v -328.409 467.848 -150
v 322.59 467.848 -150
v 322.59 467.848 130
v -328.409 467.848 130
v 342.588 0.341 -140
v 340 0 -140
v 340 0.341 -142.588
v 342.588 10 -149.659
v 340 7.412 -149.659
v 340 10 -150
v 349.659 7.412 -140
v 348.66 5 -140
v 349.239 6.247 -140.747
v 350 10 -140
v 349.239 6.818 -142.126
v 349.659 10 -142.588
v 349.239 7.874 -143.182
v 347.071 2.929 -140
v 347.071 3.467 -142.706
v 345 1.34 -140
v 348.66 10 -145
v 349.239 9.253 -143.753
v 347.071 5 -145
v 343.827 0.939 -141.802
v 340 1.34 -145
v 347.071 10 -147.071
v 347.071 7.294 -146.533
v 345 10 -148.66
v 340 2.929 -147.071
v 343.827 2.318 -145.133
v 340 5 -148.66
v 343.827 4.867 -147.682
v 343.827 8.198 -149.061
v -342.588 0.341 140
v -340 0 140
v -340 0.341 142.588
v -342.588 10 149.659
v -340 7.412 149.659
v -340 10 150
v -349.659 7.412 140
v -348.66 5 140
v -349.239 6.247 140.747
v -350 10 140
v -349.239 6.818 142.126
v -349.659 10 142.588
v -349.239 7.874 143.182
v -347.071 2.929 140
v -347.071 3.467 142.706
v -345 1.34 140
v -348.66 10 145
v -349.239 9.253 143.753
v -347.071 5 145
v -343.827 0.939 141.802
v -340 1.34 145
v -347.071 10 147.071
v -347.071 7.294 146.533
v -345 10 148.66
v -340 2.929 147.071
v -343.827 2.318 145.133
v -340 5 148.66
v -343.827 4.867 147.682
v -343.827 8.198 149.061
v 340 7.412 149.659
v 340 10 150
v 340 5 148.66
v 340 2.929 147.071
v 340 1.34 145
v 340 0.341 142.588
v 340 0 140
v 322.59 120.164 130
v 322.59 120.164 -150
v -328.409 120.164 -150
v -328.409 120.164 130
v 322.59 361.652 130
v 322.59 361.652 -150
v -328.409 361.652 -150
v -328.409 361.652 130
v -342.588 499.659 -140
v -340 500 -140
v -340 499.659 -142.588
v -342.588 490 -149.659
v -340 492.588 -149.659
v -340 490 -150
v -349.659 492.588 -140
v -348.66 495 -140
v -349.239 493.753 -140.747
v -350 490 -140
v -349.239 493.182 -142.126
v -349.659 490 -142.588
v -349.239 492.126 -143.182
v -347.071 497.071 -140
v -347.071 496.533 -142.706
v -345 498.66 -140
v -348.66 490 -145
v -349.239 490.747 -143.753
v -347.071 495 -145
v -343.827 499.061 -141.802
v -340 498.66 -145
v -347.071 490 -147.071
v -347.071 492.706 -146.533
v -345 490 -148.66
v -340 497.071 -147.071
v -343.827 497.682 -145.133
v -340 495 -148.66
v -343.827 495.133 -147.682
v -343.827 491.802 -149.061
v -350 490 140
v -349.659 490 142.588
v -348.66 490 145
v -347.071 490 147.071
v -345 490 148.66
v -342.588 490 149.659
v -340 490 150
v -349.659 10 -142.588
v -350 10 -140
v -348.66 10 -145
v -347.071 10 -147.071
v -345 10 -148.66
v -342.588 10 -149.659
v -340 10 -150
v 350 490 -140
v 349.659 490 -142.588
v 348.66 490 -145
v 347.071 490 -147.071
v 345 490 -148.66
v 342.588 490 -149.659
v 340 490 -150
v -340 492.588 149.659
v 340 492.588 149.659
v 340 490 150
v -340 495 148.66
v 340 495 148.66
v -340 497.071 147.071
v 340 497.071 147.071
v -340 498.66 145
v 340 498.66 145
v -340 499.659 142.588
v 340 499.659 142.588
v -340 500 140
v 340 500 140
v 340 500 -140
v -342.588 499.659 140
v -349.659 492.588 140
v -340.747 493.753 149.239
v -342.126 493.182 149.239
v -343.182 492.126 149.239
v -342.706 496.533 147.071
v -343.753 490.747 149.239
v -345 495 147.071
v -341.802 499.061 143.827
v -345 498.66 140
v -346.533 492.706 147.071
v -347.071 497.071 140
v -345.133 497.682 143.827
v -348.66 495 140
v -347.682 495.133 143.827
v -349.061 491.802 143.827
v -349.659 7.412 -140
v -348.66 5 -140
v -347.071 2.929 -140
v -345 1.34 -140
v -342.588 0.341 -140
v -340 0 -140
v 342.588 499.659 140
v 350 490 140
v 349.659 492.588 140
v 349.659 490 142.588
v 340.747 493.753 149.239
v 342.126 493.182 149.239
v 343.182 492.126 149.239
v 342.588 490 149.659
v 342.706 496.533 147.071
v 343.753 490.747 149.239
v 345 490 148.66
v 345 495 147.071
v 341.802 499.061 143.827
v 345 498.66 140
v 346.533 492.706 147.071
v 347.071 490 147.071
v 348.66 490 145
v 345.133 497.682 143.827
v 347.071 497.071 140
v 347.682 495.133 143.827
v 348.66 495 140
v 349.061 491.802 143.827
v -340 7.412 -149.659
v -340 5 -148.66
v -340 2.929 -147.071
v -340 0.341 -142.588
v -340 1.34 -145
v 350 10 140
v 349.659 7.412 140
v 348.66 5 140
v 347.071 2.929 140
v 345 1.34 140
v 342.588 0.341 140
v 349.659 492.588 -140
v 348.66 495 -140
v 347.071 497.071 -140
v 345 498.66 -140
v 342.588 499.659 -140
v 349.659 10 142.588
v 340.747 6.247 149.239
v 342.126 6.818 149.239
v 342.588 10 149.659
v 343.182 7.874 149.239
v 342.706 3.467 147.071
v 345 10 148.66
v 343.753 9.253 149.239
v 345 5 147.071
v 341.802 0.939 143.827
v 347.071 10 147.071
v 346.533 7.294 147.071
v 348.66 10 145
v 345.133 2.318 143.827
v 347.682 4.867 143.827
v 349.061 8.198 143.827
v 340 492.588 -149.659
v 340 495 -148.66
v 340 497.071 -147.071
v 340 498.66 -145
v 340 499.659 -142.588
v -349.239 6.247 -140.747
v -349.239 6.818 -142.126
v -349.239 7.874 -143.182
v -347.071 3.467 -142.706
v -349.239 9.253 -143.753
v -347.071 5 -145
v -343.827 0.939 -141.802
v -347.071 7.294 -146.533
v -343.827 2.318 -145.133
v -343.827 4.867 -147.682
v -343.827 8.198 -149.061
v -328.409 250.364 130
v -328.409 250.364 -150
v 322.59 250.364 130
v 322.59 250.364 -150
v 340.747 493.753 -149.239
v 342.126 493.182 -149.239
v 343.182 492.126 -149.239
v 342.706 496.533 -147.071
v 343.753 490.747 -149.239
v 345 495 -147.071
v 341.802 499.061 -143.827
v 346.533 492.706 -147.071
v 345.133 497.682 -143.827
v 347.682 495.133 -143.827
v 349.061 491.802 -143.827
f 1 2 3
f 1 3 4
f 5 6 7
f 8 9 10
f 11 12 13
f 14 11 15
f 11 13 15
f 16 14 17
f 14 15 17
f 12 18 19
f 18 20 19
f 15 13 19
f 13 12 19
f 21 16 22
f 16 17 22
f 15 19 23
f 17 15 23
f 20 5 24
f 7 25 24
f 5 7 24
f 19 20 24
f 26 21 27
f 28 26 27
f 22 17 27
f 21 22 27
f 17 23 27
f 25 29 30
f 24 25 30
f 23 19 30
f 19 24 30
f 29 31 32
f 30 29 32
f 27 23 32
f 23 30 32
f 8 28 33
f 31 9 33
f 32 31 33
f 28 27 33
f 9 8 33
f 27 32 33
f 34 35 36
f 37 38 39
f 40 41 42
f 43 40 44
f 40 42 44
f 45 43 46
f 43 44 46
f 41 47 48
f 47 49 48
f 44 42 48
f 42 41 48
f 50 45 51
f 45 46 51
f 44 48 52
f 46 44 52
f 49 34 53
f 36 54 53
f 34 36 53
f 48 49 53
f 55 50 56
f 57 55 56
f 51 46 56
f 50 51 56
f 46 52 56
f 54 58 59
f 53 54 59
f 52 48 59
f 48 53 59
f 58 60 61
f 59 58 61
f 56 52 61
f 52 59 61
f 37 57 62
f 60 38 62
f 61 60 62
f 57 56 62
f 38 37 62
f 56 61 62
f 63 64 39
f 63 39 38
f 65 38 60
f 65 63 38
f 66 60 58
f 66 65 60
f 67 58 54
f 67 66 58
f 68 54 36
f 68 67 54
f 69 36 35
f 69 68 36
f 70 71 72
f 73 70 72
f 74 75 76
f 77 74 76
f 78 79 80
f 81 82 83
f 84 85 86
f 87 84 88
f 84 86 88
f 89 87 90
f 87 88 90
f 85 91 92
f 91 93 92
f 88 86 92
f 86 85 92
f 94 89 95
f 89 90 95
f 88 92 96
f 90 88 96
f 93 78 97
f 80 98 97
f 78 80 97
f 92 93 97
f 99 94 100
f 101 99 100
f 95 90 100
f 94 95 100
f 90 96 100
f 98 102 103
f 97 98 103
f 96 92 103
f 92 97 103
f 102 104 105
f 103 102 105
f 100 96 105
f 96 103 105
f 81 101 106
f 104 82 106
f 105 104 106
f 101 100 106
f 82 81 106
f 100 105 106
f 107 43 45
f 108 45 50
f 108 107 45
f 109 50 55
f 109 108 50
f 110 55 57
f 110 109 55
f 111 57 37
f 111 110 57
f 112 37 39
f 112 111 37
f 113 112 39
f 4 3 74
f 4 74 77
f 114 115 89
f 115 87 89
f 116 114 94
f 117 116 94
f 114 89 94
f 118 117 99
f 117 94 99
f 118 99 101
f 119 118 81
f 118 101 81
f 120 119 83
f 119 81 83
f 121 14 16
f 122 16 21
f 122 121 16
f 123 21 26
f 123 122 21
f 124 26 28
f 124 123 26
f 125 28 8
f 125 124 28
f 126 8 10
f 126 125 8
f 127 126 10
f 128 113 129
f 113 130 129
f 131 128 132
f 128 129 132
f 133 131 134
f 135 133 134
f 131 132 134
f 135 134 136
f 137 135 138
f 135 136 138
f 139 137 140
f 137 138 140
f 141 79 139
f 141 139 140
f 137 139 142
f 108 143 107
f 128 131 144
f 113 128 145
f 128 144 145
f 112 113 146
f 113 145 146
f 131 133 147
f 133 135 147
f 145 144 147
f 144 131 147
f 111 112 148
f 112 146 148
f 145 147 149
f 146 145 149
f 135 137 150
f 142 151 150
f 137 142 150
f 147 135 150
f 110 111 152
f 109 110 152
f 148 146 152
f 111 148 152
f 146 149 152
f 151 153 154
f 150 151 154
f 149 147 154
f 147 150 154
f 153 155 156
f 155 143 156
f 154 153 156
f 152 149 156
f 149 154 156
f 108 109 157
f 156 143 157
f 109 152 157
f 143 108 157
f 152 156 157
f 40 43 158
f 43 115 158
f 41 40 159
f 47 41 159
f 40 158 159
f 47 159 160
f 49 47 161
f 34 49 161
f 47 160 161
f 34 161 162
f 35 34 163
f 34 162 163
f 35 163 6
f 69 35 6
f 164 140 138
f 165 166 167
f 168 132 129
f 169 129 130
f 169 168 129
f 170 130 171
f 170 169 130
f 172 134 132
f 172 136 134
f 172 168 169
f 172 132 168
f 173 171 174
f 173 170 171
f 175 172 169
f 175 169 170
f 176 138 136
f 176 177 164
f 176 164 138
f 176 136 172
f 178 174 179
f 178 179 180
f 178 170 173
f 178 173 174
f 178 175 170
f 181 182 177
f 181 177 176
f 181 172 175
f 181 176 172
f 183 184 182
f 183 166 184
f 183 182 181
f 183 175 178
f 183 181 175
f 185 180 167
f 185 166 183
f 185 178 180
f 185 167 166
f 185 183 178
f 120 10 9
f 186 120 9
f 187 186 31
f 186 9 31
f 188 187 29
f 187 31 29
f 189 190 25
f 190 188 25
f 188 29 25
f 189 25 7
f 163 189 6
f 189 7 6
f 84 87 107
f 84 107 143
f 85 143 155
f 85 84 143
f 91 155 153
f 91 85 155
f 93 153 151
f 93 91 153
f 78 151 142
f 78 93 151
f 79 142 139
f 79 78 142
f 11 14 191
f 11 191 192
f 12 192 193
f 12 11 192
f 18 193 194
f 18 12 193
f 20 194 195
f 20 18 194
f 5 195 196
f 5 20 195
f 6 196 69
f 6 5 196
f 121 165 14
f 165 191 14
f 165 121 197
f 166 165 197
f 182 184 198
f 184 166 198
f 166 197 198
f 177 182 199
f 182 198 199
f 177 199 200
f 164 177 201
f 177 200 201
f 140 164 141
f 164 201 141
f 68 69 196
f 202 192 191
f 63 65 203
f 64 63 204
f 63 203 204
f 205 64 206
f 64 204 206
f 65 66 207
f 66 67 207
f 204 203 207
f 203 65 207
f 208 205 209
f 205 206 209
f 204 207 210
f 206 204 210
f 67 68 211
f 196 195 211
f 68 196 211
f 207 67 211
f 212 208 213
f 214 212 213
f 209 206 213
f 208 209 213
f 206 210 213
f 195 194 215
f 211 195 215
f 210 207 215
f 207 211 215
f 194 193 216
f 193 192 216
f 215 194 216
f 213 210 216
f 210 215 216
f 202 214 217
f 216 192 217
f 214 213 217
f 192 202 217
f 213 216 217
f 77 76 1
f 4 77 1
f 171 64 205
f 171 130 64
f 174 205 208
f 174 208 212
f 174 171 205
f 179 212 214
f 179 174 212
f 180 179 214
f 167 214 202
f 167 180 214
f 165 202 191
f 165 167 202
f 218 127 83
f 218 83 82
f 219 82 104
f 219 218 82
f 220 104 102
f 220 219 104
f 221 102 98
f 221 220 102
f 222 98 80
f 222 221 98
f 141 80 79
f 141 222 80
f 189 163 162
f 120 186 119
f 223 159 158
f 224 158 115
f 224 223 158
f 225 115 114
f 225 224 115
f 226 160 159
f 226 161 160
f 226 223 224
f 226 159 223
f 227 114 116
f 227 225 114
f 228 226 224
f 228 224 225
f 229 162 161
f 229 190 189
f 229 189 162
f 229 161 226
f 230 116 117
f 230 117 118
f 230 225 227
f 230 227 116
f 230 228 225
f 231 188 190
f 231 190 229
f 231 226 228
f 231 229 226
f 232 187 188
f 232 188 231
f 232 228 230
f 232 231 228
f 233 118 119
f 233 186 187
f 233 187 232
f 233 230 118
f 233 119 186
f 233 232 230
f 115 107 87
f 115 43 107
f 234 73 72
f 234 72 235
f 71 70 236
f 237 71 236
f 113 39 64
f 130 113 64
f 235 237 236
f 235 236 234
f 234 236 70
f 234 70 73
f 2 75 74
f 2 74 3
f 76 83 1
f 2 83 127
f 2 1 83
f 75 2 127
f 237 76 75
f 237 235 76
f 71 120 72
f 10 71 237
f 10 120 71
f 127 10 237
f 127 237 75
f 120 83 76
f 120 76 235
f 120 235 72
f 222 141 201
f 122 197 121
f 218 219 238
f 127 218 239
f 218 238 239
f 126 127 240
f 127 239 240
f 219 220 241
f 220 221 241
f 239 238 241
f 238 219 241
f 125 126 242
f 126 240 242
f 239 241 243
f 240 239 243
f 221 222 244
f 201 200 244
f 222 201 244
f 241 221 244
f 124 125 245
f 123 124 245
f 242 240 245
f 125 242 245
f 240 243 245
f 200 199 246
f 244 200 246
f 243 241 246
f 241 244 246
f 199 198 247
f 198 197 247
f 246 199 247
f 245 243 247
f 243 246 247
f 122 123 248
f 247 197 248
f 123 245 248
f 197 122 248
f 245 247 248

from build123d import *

# Parameters (mm, degrees)
SKETCH_1_W          = 700
SKETCH_1_H          = 300
EXTRUDE_1_DEPTH     = 500
FILLET_1_R          = 10
SKETCH_2_W          = 650.999625187
SKETCH_2_H          = 106.196586902
SKETCH_2_H_2        = 130.199925037
CUT_EXTRUDE_1_DEPTH = 280


with BuildPart() as part:
    # 草图1 → 凸台-拉伸1 (new body)
    with BuildSketch(Plane(origin=(0, 0, 0), x_dir=(1, 0, 0), z_dir=(0, 1, 0))):
        Rectangle(SKETCH_1_W, SKETCH_1_H)
    extrude(amount=EXTRUDE_1_DEPTH)

    # 圆角1
    fillet_1_edges = [part.edges().sort_by_distance(p)[0] for p in [
        (350, 500, 0),
        (0, 500, -150),
        (-350, 500, 0),
        (0, 0, -150),
        (350, 0, 0),
        (0, 0, 150),
        (-350, 0, 0),
        (0, 500, 150),
        (-350, 250, -150),
        (350, 250, -150),
        (350, 250, 150),
        (-350, 250, 150),
    ]]
    fillet(fillet_1_edges, radius=FILLET_1_R)

    # 草图2 → 切除-拉伸1 (cut)
    with BuildSketch(Plane(origin=(0, 0, -150), x_dir=(-1, 0, 0), z_dir=(0, 0, -1))):
        with Locations((2.909495531, 414.750184475)):
            Rectangle(SKETCH_2_W, SKETCH_2_H)
        with Locations((2.909495531, 185.263724423)):
            Rectangle(SKETCH_2_W, SKETCH_2_H_2)
    extrude(amount=-CUT_EXTRUDE_1_DEPTH, mode=Mode.SUBTRACT)


solid = part.part
